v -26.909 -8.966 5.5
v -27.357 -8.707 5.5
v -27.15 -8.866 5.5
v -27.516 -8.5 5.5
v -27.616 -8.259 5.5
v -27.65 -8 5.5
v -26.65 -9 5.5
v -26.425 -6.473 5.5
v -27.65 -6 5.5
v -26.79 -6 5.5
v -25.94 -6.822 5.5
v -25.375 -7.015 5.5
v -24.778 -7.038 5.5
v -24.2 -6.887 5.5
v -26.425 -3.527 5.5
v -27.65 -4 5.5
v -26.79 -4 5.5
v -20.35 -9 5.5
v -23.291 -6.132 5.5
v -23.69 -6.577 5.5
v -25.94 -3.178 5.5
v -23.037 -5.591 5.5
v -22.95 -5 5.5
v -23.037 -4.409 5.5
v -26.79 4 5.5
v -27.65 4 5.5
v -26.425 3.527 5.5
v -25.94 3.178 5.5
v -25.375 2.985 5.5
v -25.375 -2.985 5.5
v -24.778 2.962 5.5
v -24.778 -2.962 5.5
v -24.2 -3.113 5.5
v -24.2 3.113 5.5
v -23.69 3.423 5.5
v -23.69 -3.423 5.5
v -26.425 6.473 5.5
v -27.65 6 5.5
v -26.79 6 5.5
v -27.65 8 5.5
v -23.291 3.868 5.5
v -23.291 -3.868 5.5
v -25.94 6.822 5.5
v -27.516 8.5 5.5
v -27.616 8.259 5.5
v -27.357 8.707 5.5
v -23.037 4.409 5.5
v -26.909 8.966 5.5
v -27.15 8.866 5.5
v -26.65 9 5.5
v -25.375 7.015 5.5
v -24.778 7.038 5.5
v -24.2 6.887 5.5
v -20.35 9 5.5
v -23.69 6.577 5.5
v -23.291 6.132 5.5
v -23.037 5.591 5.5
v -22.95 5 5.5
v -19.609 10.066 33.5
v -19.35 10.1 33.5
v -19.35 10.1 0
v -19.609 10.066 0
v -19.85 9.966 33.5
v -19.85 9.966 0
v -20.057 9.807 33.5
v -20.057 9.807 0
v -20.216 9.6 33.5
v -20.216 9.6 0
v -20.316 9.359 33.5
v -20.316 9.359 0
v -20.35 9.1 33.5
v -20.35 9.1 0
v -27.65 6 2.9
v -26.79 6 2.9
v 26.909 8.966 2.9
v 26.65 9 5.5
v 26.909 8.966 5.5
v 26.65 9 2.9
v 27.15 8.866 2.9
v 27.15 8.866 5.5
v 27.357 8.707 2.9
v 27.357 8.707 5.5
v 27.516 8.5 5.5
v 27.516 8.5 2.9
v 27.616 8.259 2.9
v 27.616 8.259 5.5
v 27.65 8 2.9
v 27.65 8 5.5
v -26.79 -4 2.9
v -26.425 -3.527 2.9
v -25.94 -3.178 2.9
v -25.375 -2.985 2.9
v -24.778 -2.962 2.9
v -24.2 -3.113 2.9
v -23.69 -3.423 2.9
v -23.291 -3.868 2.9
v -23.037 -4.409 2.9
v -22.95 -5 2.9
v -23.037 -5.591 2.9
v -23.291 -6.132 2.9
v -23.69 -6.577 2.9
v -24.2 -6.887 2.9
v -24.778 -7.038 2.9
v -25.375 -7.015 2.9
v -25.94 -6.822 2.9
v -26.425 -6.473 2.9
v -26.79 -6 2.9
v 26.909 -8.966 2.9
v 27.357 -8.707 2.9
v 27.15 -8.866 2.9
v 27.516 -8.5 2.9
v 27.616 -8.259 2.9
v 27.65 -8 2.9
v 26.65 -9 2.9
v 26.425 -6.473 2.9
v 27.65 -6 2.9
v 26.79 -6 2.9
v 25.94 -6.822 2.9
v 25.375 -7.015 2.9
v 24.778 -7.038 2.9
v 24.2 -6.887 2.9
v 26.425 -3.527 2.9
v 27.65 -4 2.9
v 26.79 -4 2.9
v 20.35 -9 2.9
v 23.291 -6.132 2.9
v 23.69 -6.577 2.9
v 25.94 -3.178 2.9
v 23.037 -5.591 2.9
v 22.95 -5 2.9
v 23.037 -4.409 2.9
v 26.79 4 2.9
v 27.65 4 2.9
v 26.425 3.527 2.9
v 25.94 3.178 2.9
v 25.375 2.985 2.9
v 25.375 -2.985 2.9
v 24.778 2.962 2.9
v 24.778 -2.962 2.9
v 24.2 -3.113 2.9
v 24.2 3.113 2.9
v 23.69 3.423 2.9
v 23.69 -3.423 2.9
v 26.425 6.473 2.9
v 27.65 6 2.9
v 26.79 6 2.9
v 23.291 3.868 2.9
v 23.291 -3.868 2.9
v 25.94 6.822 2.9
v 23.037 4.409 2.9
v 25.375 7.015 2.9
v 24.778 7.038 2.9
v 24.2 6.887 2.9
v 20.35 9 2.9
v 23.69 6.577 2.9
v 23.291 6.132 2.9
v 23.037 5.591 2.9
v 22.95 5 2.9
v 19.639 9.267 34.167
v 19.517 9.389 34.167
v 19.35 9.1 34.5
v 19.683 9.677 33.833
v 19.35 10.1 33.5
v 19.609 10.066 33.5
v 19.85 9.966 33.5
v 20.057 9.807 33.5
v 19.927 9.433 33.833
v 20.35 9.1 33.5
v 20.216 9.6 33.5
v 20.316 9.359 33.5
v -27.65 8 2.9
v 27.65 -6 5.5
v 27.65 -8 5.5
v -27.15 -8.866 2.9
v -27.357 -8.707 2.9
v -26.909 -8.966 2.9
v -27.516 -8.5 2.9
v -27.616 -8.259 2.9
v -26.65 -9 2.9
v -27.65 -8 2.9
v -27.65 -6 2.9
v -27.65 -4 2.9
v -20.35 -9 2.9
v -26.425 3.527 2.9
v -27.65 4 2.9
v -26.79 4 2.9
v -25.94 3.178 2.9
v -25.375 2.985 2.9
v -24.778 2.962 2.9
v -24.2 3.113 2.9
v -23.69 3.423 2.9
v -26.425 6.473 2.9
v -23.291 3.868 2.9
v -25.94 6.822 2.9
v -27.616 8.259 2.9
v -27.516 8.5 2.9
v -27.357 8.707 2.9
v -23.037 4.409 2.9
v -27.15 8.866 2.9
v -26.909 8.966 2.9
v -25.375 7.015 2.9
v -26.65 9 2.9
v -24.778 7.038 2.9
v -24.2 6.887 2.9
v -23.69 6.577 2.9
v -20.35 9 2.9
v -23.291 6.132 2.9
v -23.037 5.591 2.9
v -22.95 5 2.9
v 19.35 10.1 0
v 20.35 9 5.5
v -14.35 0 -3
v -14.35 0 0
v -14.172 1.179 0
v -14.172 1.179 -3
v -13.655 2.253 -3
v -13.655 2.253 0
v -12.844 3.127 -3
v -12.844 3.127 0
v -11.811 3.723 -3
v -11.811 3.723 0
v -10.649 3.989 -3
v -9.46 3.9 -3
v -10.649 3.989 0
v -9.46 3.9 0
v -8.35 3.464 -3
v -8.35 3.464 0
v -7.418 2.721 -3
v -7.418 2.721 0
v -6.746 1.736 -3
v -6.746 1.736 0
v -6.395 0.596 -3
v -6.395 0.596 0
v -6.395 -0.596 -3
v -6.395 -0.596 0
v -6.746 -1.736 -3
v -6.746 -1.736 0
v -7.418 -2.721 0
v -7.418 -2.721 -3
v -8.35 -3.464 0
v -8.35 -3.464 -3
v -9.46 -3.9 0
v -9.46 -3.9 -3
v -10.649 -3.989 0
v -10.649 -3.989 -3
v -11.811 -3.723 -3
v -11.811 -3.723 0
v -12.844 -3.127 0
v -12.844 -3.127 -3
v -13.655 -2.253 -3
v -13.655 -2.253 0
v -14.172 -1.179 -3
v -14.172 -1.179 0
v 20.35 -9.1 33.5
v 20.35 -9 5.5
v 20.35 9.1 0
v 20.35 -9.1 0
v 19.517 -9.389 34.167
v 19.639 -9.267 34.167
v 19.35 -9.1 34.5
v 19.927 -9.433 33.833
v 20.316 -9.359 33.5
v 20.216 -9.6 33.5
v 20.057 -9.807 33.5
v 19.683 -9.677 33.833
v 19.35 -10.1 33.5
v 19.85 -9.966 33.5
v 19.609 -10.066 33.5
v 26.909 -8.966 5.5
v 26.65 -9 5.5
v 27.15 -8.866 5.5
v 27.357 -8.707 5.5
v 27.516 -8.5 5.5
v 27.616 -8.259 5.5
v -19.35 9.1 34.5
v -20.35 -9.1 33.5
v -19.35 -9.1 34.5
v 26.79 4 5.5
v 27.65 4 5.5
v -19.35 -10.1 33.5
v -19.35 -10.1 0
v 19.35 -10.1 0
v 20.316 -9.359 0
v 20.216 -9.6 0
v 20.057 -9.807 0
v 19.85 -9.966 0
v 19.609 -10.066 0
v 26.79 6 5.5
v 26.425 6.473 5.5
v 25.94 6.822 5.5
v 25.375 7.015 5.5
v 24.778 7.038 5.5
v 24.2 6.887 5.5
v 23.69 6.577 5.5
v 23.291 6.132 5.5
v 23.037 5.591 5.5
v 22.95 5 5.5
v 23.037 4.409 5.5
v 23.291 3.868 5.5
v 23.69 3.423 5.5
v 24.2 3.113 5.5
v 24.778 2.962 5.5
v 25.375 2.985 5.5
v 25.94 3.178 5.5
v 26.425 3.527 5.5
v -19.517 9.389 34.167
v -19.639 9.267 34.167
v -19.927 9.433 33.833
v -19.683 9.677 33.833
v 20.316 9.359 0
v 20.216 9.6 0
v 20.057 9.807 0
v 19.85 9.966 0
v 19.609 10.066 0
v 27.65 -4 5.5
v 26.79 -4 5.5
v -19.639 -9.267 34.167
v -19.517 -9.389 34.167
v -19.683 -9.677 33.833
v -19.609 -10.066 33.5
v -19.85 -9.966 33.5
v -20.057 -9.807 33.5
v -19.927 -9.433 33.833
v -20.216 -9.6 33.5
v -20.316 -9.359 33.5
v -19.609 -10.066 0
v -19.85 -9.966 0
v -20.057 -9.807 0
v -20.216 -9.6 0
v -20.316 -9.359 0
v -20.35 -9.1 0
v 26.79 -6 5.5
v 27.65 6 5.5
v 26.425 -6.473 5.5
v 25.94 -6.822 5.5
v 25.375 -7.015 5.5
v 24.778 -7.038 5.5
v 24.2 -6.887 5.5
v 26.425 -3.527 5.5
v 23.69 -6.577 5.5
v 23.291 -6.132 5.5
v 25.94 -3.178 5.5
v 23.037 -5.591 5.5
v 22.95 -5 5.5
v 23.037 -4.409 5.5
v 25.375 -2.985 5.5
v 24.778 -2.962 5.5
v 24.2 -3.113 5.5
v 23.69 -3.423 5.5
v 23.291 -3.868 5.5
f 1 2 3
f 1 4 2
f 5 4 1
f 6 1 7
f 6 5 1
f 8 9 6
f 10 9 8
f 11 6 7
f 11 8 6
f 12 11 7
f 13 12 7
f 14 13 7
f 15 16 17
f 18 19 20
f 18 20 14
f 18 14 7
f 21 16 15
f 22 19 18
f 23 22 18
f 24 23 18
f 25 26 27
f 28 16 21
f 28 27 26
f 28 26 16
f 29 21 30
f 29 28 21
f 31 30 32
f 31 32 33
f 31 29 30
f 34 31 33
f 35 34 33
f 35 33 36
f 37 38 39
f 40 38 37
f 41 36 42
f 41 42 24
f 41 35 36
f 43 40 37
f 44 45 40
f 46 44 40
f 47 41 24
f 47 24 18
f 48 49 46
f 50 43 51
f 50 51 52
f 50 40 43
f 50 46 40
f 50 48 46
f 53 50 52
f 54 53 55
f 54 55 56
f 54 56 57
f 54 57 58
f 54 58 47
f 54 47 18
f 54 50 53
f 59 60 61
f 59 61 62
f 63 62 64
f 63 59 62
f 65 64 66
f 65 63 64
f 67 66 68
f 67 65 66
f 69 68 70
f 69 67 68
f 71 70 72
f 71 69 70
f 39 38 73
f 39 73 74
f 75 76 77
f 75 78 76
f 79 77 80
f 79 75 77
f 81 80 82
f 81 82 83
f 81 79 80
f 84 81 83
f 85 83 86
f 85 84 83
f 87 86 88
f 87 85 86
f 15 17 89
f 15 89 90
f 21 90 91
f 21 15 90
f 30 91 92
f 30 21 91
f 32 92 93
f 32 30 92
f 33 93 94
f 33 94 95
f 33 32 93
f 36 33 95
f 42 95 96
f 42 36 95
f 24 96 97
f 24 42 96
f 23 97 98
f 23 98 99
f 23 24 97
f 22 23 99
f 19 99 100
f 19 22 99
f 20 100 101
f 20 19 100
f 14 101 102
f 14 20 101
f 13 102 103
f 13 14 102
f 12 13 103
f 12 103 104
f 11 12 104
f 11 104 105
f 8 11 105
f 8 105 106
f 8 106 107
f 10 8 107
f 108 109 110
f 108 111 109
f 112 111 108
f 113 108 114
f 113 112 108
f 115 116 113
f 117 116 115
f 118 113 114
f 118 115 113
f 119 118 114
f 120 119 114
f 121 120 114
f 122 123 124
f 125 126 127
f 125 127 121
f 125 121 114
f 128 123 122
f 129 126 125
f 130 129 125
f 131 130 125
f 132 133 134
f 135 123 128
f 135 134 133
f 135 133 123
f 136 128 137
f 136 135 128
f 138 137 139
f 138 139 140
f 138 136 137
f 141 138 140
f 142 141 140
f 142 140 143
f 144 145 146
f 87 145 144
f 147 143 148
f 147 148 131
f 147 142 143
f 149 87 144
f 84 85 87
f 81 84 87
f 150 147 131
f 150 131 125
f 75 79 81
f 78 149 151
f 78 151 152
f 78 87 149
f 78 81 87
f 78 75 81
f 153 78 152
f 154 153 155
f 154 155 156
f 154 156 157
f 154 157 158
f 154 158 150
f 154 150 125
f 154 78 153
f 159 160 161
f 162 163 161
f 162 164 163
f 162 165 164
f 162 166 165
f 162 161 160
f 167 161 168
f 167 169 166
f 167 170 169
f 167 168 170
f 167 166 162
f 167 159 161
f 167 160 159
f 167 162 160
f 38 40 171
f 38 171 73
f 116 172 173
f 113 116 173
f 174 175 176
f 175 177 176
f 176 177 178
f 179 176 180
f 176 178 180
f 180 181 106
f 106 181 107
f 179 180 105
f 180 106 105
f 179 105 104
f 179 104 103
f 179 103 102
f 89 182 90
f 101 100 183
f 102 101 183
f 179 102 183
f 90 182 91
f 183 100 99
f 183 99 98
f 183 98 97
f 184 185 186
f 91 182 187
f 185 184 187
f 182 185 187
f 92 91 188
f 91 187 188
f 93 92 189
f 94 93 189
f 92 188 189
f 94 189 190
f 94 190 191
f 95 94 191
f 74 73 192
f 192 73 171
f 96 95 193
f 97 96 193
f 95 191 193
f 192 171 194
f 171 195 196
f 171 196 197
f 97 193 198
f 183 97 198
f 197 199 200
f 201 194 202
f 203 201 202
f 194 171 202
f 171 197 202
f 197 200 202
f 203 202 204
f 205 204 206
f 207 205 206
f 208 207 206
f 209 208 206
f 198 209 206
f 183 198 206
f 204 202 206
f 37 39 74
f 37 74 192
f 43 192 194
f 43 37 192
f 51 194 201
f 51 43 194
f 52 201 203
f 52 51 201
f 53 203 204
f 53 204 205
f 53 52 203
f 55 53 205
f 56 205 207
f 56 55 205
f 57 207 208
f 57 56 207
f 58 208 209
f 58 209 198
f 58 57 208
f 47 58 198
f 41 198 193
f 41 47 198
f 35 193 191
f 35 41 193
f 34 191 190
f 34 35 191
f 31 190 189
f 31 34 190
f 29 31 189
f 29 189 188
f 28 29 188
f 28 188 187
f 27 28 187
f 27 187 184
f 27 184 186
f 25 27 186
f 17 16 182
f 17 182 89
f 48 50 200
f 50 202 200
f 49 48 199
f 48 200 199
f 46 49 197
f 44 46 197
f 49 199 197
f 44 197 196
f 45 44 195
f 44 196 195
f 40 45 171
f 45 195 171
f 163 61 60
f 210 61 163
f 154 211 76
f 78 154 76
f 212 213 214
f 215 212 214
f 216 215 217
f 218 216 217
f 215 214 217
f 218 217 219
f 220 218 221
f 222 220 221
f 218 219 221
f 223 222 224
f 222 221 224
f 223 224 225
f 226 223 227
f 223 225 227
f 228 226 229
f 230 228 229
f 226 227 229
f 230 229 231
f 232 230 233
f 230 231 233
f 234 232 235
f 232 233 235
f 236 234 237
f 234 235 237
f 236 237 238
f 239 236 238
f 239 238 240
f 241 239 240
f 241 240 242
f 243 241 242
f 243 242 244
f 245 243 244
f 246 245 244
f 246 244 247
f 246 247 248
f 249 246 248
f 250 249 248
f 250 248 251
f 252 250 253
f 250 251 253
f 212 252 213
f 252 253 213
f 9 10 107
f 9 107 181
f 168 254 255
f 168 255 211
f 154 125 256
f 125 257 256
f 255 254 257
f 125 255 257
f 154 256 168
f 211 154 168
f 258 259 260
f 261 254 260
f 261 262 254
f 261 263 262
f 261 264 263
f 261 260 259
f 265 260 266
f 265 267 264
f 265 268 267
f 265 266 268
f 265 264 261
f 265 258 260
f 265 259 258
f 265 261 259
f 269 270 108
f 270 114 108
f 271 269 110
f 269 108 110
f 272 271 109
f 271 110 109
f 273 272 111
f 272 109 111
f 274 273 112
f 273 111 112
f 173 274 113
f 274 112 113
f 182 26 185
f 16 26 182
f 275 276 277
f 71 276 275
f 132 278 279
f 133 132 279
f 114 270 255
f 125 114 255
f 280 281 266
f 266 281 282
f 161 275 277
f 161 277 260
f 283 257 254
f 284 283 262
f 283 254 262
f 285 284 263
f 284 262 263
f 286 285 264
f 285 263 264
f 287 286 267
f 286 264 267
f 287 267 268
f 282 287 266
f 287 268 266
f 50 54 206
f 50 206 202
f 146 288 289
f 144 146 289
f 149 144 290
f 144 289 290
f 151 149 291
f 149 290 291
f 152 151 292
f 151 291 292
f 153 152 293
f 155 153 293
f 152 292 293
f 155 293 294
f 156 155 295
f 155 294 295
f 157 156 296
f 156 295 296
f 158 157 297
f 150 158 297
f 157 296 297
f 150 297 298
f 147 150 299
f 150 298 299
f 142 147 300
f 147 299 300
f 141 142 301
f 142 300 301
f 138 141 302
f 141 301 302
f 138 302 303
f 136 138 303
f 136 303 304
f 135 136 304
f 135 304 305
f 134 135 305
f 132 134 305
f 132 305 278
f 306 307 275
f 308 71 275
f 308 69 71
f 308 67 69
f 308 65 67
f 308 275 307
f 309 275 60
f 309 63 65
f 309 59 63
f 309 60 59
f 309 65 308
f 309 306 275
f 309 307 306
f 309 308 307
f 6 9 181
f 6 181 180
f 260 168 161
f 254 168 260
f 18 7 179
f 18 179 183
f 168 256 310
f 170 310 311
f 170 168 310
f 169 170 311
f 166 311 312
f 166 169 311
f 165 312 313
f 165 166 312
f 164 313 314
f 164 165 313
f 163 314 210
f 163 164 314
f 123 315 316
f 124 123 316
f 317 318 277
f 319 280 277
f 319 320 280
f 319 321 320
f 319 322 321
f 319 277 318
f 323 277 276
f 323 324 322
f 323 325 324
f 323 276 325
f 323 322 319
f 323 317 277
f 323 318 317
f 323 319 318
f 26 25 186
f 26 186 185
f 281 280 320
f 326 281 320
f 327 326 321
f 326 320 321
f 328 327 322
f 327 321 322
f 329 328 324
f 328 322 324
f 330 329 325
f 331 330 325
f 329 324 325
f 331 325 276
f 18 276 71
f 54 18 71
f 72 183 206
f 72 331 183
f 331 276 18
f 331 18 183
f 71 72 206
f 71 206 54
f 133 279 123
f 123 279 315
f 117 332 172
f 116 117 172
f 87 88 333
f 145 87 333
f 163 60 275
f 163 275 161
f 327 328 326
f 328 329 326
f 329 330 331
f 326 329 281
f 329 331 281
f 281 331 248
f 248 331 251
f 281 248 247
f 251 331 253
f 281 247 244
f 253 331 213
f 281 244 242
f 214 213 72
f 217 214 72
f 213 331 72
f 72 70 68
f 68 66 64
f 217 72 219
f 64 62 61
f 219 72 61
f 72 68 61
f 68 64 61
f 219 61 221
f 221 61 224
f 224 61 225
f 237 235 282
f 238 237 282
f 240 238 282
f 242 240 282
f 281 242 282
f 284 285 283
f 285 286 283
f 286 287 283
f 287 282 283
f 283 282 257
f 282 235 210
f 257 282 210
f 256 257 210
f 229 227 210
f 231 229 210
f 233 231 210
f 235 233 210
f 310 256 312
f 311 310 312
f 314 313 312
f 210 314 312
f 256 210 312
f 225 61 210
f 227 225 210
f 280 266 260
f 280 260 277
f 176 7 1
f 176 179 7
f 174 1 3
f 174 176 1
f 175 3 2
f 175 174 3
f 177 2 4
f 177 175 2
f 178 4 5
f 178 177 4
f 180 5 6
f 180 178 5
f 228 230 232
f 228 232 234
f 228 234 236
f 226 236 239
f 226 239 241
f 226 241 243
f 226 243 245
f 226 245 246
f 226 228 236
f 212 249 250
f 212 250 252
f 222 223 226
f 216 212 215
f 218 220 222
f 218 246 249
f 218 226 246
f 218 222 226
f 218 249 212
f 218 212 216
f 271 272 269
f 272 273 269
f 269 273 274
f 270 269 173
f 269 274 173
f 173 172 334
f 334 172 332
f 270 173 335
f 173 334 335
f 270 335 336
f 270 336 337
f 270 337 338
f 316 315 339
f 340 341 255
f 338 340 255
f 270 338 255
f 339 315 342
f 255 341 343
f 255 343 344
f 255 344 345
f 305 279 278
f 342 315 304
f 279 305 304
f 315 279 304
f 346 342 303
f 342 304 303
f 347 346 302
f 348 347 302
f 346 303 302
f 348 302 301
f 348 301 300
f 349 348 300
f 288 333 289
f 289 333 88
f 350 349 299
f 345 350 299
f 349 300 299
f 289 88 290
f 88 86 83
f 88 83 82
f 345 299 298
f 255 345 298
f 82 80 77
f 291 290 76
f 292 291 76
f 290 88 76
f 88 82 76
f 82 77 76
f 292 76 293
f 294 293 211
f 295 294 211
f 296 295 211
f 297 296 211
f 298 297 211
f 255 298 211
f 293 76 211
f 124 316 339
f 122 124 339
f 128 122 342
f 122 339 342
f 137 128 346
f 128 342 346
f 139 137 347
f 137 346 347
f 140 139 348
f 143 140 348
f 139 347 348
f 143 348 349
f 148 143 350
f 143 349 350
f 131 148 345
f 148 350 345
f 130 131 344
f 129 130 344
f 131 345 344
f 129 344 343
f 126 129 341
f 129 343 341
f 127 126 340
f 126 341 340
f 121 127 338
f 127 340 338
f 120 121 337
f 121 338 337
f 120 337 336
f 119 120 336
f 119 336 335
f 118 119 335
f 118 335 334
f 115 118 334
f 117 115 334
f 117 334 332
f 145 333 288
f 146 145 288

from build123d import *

# Parameters (mm, degrees)
SKETCH1_W            = 40.7
SKETCH1_H            = 20.2
BOSS_EXTRUDE1_DEPTH  = 34.5
BOSS_EXTRUDE2_DEPTH  = 2.6
FILLET2_R            = 1
FILLET2_OF_MIRROR1_R = 1
FILLET1_R            = 1
CHAMFER1_SIZE        = 1
SKETCH3_R            = 4
BOSS_EXTRUDE3_DEPTH  = 3


with BuildPart() as part:
    # Sketch1 → Boss-Extrude1 (new body)
    with BuildSketch(Plane.XY):
        Rectangle(SKETCH1_W, SKETCH1_H)
    extrude(amount=BOSS_EXTRUDE1_DEPTH)

    # Sketch2 → Boss-Extrude2 (add)
    with BuildSketch(Plane.XY.offset(5.5)):
        with BuildLine():
            Line((-20.35, 9), (-27.65, 9))
            Line((-27.65, 9), (-27.65, 6))
            Line((-27.65, 6), (-26.789553017, 6))
            ThreePointArc((-26.789553017, 6), (-22.95, 5), (-26.789553017, 4))
            Line((-26.789553017, 4), (-27.65, 4))
            Line((-27.65, 4), (-27.65, -4))
            Line((-27.65, -4), (-26.789553017, -4))
            ThreePointArc((-26.789553017, -4), (-22.95, -5), (-26.789553017, -6))
            Line((-26.789553017, -6), (-27.65, -6))
            Line((-27.65, -6), (-27.65, -9))
            Line((-27.65, -9), (-20.35, -9))
            Line((-20.35, -9), (-20.35, 9))
        make_face()
    boss_extrude2 = extrude(amount=-BOSS_EXTRUDE2_DEPTH)

    # Fillet2
    fillet2_edges = [part.edges().sort_by_distance(p)[0] for p in [
        (-27.65, -9, 4.2),
        (-27.65, 9, 4.2),
    ]]
    fillet(fillet2_edges, radius=FILLET2_R)

    # Mirror1: Boss-Extrude2 across plane
    add(boss_extrude2.mirror(Plane(origin=(0, 0, 0), x_dir=(0, 0, 1), z_dir=(1, 0, 0))))

    # Fillet2 of Mirror1
    fillet2_of_mirror1_edges = [part.edges().sort_by_distance(p)[0] for p in [
        (27.65, -9, 4.2),
        (27.65, 9, 4.2),
    ]]
    fillet(fillet2_of_mirror1_edges, radius=FILLET2_OF_MIRROR1_R)

    # Fillet1
    fillet1_edges = [part.edges().sort_by_distance(p)[0] for p in [
        (20.35, -10.1, 17.25),
        (-20.35, -10.1, 17.25),
        (-20.35, 10.1, 17.25),
        (20.35, 10.1, 17.25),
    ]]
    fillet(fillet1_edges, radius=FILLET1_R)

    # Chamfer1
    chamfer1_edges = [part.edges().sort_by_distance(p)[0] for p in [
        (-20.35, 0, 34.5),
        (20.35, 0, 34.5),
        (0, 10.1, 34.5),
        (-20.057106781, 9.807106781, 34.5),
        (20.057106781, 9.807106781, 34.5),
        (20.057106781, -9.807106781, 34.5),
        (-20.057106781, -9.807106781, 34.5),
        (0, -10.1, 34.5),
    ]]
    chamfer(chamfer1_edges, length=CHAMFER1_SIZE)

    # Sketch3 → Boss-Extrude3 (add)
    with BuildSketch(Plane(origin=(0, 0, 0), x_dir=(-1, 0, 0), z_dir=(0, 0, -1))):
        with Locations((10.35, 0)):
            Circle(SKETCH3_R)
    extrude(amount=BOSS_EXTRUDE3_DEPTH)


solid = part.part
